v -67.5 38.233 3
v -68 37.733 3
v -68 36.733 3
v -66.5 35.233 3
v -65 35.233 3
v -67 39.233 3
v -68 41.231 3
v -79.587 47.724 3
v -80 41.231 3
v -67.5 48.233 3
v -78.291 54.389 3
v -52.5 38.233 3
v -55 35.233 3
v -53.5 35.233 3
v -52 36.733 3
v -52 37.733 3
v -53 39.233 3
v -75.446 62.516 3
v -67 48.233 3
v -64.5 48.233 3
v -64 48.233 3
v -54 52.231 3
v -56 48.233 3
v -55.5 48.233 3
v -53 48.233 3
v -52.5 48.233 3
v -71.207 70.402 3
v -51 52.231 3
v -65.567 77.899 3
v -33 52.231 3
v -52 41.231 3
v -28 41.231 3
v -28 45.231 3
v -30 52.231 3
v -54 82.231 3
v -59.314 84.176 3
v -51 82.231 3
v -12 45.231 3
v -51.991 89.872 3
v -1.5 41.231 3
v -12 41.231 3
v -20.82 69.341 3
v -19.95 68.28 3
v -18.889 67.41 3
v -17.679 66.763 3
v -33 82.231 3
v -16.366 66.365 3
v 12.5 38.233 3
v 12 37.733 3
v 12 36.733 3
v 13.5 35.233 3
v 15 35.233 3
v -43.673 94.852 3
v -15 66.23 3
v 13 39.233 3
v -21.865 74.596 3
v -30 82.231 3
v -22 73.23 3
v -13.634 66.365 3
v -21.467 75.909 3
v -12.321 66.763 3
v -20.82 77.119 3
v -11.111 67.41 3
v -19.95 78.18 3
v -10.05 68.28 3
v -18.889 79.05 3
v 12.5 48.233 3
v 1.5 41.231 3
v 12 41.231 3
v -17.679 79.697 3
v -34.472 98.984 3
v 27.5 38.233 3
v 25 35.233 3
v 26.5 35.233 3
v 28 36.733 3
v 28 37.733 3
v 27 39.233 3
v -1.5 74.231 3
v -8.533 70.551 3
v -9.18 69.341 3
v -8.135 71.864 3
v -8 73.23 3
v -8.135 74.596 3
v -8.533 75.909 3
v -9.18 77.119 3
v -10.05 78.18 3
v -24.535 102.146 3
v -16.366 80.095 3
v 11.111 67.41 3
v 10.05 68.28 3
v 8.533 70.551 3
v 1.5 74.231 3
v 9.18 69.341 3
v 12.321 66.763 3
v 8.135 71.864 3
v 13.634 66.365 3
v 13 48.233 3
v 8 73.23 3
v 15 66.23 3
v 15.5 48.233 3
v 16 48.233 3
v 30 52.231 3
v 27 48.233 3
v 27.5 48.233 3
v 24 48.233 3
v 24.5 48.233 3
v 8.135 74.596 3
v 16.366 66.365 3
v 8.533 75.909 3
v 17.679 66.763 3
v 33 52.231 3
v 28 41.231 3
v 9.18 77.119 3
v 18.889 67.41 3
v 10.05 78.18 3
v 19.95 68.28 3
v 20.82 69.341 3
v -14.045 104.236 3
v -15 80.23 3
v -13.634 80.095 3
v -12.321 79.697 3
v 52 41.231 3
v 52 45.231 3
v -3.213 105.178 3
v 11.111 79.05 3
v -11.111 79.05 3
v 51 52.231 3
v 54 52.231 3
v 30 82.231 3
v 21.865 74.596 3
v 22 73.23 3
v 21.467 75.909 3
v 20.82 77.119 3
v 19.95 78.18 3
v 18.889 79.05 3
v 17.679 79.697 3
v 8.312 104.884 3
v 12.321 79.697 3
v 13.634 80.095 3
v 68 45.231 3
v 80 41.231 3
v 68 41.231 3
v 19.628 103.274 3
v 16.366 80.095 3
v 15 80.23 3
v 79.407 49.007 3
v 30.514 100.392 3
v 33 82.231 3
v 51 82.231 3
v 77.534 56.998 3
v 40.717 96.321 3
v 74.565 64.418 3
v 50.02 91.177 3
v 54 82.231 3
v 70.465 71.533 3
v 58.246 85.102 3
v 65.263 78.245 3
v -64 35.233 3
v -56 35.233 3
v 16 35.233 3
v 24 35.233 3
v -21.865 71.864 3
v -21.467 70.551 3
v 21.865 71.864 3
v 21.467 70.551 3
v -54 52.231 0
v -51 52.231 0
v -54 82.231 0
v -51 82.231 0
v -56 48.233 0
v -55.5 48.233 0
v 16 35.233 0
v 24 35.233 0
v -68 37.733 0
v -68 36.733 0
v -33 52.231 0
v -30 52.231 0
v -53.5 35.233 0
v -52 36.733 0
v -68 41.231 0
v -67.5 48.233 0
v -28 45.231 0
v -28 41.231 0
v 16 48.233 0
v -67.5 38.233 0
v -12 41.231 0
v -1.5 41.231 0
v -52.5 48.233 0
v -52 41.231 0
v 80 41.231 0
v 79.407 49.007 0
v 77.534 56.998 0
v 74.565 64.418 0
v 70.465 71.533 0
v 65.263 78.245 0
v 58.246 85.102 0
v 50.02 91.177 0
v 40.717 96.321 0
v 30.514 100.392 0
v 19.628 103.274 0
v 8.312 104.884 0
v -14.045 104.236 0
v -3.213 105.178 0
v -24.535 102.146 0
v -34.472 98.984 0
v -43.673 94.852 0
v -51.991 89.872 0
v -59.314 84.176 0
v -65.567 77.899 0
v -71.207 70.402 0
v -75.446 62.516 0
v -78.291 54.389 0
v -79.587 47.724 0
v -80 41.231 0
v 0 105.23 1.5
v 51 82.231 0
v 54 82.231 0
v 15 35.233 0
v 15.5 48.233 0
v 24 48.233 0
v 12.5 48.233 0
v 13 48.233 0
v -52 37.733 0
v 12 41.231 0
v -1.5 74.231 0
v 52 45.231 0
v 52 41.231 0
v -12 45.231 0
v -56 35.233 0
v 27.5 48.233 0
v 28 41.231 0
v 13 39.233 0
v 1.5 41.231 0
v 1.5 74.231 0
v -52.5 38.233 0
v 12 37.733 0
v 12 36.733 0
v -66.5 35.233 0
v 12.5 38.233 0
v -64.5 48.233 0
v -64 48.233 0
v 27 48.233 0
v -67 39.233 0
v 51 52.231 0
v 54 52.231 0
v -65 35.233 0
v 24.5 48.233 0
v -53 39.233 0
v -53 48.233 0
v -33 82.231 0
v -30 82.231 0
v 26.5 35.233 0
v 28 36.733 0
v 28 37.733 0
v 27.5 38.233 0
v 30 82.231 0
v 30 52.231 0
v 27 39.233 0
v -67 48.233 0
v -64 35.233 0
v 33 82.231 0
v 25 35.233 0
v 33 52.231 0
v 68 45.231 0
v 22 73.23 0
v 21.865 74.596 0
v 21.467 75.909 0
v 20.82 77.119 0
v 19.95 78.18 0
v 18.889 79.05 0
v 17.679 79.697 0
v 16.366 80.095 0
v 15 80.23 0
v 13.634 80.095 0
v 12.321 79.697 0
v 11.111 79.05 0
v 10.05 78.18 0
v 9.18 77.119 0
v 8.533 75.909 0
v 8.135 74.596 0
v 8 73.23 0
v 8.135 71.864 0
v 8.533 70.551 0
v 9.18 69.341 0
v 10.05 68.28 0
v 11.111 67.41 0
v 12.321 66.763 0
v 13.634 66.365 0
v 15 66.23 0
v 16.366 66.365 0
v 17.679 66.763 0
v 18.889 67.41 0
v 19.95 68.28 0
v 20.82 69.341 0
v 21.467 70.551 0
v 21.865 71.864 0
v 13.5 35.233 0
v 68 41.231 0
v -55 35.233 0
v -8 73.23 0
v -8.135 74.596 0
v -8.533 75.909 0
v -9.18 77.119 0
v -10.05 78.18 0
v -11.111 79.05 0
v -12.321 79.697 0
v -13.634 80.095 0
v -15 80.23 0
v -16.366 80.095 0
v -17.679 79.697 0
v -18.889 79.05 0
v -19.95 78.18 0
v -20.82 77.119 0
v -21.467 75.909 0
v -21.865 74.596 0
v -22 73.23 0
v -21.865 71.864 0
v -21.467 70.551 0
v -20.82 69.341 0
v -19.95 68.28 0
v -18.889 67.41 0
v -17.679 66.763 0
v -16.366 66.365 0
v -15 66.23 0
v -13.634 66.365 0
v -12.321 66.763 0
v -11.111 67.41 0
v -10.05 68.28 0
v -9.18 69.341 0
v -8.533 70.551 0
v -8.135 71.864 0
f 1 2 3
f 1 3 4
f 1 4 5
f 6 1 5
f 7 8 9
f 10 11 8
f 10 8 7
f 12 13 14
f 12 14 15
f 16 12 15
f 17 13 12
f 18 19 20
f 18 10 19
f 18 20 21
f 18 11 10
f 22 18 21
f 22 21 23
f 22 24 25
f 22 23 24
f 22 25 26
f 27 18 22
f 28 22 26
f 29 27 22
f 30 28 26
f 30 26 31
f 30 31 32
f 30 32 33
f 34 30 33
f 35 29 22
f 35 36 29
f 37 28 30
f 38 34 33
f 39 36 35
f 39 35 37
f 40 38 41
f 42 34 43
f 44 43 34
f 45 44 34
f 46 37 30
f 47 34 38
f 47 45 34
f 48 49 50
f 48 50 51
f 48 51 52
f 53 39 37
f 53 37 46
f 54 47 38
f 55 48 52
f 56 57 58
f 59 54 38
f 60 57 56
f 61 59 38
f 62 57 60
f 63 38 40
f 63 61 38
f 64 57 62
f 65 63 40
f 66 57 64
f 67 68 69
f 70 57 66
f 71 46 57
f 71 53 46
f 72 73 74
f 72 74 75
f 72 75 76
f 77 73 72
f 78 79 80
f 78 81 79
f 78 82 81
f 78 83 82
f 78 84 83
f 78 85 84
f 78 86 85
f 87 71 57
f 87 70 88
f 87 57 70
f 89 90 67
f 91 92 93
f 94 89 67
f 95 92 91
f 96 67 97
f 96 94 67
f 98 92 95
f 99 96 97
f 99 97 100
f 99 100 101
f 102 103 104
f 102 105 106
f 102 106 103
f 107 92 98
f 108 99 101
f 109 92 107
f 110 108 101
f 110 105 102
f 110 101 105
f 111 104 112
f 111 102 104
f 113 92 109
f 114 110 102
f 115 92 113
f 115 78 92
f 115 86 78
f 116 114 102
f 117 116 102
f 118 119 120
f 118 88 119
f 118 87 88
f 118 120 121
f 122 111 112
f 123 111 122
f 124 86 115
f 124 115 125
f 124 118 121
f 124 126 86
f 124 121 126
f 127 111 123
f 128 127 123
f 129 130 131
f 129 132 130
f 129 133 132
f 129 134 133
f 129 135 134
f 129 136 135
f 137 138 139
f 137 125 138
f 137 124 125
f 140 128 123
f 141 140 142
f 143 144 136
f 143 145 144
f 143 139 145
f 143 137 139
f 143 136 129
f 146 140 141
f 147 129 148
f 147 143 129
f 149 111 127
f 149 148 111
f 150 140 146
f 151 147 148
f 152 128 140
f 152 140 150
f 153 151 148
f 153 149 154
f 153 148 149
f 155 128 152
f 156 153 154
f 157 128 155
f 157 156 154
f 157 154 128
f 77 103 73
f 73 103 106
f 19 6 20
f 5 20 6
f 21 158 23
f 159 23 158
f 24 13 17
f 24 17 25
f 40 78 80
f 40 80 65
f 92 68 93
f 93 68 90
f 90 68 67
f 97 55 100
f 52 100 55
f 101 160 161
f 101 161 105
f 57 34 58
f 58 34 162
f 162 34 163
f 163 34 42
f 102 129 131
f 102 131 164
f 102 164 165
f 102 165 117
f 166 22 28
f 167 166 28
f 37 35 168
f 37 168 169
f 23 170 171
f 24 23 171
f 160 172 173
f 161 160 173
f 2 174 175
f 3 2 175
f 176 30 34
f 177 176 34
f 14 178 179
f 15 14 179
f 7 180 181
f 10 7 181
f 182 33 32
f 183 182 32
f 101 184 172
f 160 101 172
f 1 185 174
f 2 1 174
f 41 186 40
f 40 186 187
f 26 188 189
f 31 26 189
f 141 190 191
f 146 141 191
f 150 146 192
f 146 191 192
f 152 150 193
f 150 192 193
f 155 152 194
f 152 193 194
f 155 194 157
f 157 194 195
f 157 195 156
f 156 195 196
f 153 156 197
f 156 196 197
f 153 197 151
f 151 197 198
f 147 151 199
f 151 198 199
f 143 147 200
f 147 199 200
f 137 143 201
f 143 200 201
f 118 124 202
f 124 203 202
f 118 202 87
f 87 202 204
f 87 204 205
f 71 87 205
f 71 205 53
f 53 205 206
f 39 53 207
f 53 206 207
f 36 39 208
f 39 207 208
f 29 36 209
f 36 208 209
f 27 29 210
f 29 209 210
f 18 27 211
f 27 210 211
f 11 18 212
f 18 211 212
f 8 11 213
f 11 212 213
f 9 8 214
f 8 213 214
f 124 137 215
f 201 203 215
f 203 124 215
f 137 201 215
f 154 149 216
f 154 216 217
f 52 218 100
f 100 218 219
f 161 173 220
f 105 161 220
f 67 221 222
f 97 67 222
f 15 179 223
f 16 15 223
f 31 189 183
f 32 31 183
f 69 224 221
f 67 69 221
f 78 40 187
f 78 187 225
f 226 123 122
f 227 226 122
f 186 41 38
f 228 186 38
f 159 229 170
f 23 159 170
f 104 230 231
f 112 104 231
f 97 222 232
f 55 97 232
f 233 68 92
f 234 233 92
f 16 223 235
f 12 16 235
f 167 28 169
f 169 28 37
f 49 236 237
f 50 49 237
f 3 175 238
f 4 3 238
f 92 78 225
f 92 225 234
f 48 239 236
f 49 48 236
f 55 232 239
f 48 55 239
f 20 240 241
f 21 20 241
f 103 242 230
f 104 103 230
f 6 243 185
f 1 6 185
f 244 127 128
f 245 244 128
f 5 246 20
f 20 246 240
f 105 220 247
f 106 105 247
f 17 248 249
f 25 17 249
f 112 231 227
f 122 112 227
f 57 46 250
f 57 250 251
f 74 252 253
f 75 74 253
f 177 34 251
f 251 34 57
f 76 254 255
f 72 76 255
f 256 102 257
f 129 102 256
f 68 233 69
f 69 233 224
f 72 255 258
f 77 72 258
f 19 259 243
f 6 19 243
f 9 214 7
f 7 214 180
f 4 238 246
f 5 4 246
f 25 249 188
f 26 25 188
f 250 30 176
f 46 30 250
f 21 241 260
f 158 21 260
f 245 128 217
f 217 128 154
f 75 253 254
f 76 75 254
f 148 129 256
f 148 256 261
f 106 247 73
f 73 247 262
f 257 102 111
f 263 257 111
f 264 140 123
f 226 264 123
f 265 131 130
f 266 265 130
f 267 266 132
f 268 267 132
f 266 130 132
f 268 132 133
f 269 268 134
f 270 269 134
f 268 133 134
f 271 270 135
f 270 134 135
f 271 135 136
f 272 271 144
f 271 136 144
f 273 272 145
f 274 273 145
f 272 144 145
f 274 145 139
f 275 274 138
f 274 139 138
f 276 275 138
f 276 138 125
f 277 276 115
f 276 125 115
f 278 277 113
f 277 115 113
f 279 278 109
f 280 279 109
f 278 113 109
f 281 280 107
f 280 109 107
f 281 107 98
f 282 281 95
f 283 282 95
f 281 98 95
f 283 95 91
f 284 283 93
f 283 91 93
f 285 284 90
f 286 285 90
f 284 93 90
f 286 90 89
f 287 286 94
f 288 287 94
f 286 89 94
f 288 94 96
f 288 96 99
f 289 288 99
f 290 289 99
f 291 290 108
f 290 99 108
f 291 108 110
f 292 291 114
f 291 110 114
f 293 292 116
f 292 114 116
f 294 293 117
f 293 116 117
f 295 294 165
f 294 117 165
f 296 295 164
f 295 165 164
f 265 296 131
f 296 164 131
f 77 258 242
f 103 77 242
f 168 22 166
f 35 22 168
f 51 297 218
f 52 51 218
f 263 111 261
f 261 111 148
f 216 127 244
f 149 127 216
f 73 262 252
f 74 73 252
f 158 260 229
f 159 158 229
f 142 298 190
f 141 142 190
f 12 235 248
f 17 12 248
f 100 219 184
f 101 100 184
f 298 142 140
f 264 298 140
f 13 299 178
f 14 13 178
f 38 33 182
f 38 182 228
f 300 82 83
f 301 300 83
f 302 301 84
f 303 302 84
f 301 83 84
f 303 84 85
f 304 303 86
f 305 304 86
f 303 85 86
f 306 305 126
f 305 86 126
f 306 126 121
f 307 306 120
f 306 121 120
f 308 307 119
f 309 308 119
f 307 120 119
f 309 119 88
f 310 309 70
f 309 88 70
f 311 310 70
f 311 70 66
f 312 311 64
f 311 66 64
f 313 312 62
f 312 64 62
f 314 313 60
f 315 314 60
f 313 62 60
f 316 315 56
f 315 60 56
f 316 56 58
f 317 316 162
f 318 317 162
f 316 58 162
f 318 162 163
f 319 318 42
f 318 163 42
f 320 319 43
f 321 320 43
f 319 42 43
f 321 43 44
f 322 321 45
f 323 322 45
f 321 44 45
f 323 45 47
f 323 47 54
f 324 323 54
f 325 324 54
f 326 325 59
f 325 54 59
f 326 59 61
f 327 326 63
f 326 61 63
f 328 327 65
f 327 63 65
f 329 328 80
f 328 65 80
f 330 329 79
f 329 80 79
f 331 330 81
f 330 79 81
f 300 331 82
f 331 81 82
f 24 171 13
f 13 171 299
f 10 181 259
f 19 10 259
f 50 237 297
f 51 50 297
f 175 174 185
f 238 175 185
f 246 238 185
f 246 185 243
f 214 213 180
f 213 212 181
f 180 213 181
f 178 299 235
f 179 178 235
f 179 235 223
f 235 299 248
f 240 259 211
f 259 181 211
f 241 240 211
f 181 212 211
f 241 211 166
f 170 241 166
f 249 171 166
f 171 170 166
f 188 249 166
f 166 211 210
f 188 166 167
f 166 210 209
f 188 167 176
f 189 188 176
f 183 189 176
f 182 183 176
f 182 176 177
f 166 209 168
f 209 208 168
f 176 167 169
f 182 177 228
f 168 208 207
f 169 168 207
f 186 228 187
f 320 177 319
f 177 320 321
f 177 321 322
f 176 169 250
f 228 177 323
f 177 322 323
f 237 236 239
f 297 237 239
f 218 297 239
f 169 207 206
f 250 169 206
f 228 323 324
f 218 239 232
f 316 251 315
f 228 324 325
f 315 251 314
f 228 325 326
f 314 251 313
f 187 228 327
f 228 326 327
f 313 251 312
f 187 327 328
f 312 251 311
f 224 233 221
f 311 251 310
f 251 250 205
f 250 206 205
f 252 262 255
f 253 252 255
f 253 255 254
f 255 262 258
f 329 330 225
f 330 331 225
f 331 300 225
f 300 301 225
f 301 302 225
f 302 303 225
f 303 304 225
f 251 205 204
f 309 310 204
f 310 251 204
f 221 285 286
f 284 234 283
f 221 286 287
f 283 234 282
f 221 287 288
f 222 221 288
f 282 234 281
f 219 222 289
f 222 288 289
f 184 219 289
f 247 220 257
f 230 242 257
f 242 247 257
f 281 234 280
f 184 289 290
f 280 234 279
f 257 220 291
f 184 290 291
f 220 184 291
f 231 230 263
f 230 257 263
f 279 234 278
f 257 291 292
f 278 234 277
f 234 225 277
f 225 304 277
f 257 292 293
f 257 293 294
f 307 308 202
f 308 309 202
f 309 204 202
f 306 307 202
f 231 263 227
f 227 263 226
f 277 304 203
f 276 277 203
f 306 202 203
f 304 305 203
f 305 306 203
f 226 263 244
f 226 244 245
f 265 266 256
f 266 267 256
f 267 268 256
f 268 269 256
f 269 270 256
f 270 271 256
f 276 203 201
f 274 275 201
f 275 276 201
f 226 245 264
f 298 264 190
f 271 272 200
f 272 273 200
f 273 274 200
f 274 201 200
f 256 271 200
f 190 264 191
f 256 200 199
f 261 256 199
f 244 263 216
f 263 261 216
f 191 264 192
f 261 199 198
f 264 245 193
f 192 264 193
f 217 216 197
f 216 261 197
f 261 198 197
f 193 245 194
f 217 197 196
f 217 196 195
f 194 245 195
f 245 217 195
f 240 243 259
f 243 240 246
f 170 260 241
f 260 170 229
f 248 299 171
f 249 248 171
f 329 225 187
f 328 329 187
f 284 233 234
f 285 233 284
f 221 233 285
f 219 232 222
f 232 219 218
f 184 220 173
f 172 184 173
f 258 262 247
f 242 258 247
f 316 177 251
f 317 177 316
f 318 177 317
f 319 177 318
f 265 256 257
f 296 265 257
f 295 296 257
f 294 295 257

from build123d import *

# Parameters (mm, degrees)
BOSS_EXTRUDE1_DEPTH     = 3
SKETCH3_W               = 3
SKETCH3_H               = 33
CUT_EXTRUDE1_DEPTH      = 1.0000001
CUT_EXTRUDE1_DEPTH_BACK = 3
CUT_EXTRUDE2_DEPTH      = 1.0000001
CUT_EXTRUDE2_DEPTH_BACK = 3
CUT_EXTRUDE3_DEPTH      = 1.0000001
CUT_EXTRUDE3_DEPTH_BACK = 3
SKETCH7_W               = 3
SKETCH7_H               = 30
CUT_EXTRUDE4_DEPTH      = 3
SKETCH8_R               = 7
CUT_EXTRUDE5_DEPTH      = 3


with BuildPart() as part:
    # Sketch1 → Boss-Extrude1 (new body)
    with BuildSketch(Plane.XY):
        with BuildLine():
            Line((-80, 41.231056256), (-68, 41.231056256))
            Line((-68, 41.231056256), (-67.5, 48.233227348))
            Line((-67.5, 48.233227348), (-67, 48.233227348))
            Line((-67, 48.233227348), (-67, 39.233227348))
            Line((-67, 39.233227348), (-67.5, 38.233227348))
            Line((-67.5, 38.233227348), (-68, 37.733227348))
            Line((-68, 37.733227348), (-68, 36.733227348))
            Line((-68, 36.733227348), (-66.5, 35.233227348))
            Line((-66.5, 35.233227348), (-65, 35.233227348))
            Line((-65, 35.233227348), (-64.5, 48.233227348))
            Line((-64.5, 48.233227348), (-64, 48.233227348))
            Line((-64, 48.233227348), (-64, 35.233227348))
            Line((-64, 35.233227348), (-56, 35.233227348))
            Line((-56, 35.233227348), (-56, 48.233227348))
            Line((-56, 48.233227348), (-55.5, 48.233227348))
            Line((-55.5, 48.233227348), (-55, 35.233227348))
            Line((-55, 35.233227348), (-53.5, 35.233227348))
            Line((-53.5, 35.233227348), (-52, 36.733227348))
            Line((-52, 36.733227348), (-52, 37.733227348))
            Line((-52, 37.733227348), (-52.5, 38.233227348))
            Line((-52.5, 38.233227348), (-53, 39.233227348))
            Line((-53, 39.233227348), (-53, 48.233227348))
            Line((-53, 48.233227348), (-52.5, 48.233227348))
            Line((-52.5, 48.233227348), (-52, 41.231056256))
            Line((-52, 41.231056256), (12, 41.231056256))
            Line((12, 41.231056256), (12.5, 48.233227348))
            Line((12.5, 48.233227348), (13, 48.233227348))
            Line((13, 48.233227348), (13, 39.233227348))
            Line((13, 39.233227348), (12.5, 38.233227348))
            Line((12.5, 38.233227348), (12, 37.733227348))
            Line((12, 37.733227348), (12, 36.733227348))
            Line((12, 36.733227348), (13.5, 35.233227348))
            Line((13.5, 35.233227348), (15, 35.233227348))
            Line((15, 35.233227348), (15.5, 48.233227348))
            Line((15.5, 48.233227348), (16, 48.233227348))
            Line((16, 48.233227348), (16, 35.233227348))
            Line((16, 35.233227348), (24, 35.233227348))
            Line((24, 35.233227348), (24, 48.233227348))
            Line((24, 48.233227348), (24.5, 48.233227348))
            Line((24.5, 48.233227348), (25, 35.233227348))
            Line((25, 35.233227348), (26.5, 35.233227348))
            Line((26.5, 35.233227348), (28, 36.733227348))
            Line((28, 36.733227348), (28, 37.733227348))
            Line((28, 37.733227348), (27.5, 38.233227348))
            Line((27.5, 38.233227348), (27, 39.233227348))
            Line((27, 39.233227348), (27, 48.233227348))
            Line((27, 48.233227348), (27.5, 48.233227348))
            Line((27.5, 48.233227348), (28, 41.231056256))
            Line((28, 41.231056256), (80, 41.231056256))
            add(Edge.make_bspline(
                [(80, 41.231056256), (80, 105.23), (0, 105.23)],
                knots=[0, 0, 0, 1.570796327, 1.570796327, 1.570796327], degree=2, weights=[1, 0.707106781, 1]))
            add(Edge.make_bspline(
                [(0, 105.23), (-80, 105.23), (-80, 41.231056256)],
                knots=[4.71238898, 4.71238898, 4.71238898, 6.283185307, 6.283185307, 6.283185307], degree=2, weights=[1, 0.707106781, 1]))
        make_face()
    extrude(amount=BOSS_EXTRUDE1_DEPTH)

    # Sketch3 → Cut-Extrude1 (cut, two sides)
    with BuildSketch(Plane.XY.offset(3)) as cut_extrude1_sk:
        with Locations((0, 57.731056256)):
            Rectangle(SKETCH3_W, SKETCH3_H)
    extrude(amount=CUT_EXTRUDE1_DEPTH, mode=Mode.SUBTRACT)
    extrude(cut_extrude1_sk.sketch, amount=-CUT_EXTRUDE1_DEPTH_BACK, mode=Mode.SUBTRACT)

    # Sketch4 → Cut-Extrude2 (cut, two sides)
    with BuildSketch(Plane.XY.offset(3)) as cut_extrude2_sk:
        Polygon((-28, -219.845544284), (-28, 41.231056256), (-28, 45.231056256), (-12, 45.231056256), (-12, 41.231056256), (-12, -219.845544284), (-12, -741.998745365), (-28, -741.998745365), align=None)
    extrude(amount=CUT_EXTRUDE2_DEPTH, mode=Mode.SUBTRACT)
    extrude(cut_extrude2_sk.sketch, amount=-CUT_EXTRUDE2_DEPTH_BACK, mode=Mode.SUBTRACT)

    # Sketch5 → Cut-Extrude3 (cut, two sides)
    with BuildSketch(Plane.XY.offset(3)) as cut_extrude3_sk:
        Polygon((68, -291.258415465), (68, 41.231056256), (68, 45.231056256), (52, 45.231056256), (52, 41.231056256), (52, -291.258415465), (52, -956.237358907), (68, -956.237358907), align=None)
    extrude(amount=CUT_EXTRUDE3_DEPTH, mode=Mode.SUBTRACT)
    extrude(cut_extrude3_sk.sketch, amount=-CUT_EXTRUDE3_DEPTH_BACK, mode=Mode.SUBTRACT)

    # Sketch7 → Cut-Extrude4 (cut)
    with BuildSketch(Plane.XY.offset(3)):
        with Locations((-52.5, 67.231)):
            Rectangle(SKETCH7_W, SKETCH7_H)
        with Locations((52.5, 67.231)):
            Rectangle(SKETCH7_W, SKETCH7_H)
        with Locations((-31.5, 67.231)):
            Rectangle(SKETCH7_W, SKETCH7_H)
        with Locations((31.5, 67.231)):
            Rectangle(SKETCH7_W, SKETCH7_H)
    extrude(amount=-CUT_EXTRUDE4_DEPTH, mode=Mode.SUBTRACT)

    # Sketch8 → Cut-Extrude5 (cut)
    with BuildSketch(Plane.XY.offset(3)):
        with Locations((-15, 73.23)):
            Circle(SKETCH8_R)
        with Locations((15, 73.23)):
            Circle(SKETCH8_R)
    extrude(amount=-CUT_EXTRUDE5_DEPTH, mode=Mode.SUBTRACT)


solid = part.part
